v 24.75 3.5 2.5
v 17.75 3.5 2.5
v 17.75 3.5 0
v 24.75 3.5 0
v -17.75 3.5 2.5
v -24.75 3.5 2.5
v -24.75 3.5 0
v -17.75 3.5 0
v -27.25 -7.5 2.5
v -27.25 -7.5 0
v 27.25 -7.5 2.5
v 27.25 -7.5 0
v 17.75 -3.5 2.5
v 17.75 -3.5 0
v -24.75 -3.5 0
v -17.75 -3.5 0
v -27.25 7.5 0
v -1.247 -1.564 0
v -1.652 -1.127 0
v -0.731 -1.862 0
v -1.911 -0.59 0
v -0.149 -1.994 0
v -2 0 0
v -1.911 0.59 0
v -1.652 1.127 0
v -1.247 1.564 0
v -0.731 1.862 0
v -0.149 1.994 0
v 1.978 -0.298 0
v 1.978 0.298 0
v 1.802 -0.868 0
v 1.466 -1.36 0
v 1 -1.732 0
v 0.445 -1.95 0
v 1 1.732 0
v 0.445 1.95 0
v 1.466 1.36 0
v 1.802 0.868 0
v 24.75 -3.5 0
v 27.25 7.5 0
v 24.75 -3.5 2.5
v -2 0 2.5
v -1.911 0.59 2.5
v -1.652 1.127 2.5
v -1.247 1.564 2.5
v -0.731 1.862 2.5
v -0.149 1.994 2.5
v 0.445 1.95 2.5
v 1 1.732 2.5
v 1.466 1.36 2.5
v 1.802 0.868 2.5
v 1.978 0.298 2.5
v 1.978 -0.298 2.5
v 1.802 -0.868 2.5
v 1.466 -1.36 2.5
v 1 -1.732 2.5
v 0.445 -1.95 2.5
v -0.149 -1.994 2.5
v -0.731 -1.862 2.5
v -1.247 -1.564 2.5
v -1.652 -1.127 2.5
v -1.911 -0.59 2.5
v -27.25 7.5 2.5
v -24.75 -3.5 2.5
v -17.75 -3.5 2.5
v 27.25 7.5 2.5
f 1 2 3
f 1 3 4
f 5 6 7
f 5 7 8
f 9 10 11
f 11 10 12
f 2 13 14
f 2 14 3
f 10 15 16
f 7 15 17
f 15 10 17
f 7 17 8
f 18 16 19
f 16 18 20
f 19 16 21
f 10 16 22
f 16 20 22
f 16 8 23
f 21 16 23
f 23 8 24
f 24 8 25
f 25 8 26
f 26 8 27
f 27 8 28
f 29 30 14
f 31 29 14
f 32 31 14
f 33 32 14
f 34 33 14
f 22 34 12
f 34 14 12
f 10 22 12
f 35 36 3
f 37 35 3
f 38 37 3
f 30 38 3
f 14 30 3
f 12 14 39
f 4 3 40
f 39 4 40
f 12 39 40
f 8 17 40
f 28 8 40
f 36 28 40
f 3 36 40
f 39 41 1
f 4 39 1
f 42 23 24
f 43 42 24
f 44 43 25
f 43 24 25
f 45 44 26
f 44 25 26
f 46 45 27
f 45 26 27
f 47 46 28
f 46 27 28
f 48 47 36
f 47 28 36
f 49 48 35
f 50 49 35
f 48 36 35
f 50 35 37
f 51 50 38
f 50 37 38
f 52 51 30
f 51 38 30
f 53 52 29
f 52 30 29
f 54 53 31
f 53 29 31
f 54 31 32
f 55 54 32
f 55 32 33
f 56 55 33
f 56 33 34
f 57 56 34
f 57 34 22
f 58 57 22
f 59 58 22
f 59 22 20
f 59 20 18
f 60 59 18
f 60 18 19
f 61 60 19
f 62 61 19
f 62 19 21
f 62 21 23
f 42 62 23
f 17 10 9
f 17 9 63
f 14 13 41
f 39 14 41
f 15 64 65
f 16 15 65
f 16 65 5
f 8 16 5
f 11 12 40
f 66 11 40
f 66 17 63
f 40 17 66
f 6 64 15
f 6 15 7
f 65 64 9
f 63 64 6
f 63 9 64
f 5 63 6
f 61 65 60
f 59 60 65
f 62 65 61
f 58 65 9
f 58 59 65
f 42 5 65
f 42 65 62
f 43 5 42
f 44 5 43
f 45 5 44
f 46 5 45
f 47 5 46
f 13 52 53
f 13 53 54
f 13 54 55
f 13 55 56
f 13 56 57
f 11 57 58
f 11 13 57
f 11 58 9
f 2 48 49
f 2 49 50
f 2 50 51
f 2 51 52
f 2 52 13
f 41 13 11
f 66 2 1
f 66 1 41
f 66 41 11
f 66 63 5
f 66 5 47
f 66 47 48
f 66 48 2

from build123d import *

# Parameters (mm, degrees)
F0_W     = 54.5
F0_H     = 15
F1_DEPTH = 2.5
F3_D     = 4
F4_W     = 7
F4_H     = 7
F5_DEPTH = 2.501


with BuildPart() as f1:
    # F0 (on Top) → F1 (new body)
    with BuildSketch(Plane.XY):
        Rectangle(F0_W, F0_H)
    extrude(amount=F1_DEPTH)

    # F3 (through all)
    with Locations(Plane.XY.offset(2.5)):
        with Locations((0, 0)):
            Hole(F3_D / 2)

    # F4 (on face) → F5 (cut, through all)
    with BuildSketch(Plane.XY.offset(2.5)):
        with Locations((-21.25, 0)):
            Rectangle(F4_W, F4_H)
        with Locations((21.25, 0)):
            Rectangle(F4_W, F4_H)
    extrude(amount=-F5_DEPTH, mode=Mode.SUBTRACT)


solid = f1.part
